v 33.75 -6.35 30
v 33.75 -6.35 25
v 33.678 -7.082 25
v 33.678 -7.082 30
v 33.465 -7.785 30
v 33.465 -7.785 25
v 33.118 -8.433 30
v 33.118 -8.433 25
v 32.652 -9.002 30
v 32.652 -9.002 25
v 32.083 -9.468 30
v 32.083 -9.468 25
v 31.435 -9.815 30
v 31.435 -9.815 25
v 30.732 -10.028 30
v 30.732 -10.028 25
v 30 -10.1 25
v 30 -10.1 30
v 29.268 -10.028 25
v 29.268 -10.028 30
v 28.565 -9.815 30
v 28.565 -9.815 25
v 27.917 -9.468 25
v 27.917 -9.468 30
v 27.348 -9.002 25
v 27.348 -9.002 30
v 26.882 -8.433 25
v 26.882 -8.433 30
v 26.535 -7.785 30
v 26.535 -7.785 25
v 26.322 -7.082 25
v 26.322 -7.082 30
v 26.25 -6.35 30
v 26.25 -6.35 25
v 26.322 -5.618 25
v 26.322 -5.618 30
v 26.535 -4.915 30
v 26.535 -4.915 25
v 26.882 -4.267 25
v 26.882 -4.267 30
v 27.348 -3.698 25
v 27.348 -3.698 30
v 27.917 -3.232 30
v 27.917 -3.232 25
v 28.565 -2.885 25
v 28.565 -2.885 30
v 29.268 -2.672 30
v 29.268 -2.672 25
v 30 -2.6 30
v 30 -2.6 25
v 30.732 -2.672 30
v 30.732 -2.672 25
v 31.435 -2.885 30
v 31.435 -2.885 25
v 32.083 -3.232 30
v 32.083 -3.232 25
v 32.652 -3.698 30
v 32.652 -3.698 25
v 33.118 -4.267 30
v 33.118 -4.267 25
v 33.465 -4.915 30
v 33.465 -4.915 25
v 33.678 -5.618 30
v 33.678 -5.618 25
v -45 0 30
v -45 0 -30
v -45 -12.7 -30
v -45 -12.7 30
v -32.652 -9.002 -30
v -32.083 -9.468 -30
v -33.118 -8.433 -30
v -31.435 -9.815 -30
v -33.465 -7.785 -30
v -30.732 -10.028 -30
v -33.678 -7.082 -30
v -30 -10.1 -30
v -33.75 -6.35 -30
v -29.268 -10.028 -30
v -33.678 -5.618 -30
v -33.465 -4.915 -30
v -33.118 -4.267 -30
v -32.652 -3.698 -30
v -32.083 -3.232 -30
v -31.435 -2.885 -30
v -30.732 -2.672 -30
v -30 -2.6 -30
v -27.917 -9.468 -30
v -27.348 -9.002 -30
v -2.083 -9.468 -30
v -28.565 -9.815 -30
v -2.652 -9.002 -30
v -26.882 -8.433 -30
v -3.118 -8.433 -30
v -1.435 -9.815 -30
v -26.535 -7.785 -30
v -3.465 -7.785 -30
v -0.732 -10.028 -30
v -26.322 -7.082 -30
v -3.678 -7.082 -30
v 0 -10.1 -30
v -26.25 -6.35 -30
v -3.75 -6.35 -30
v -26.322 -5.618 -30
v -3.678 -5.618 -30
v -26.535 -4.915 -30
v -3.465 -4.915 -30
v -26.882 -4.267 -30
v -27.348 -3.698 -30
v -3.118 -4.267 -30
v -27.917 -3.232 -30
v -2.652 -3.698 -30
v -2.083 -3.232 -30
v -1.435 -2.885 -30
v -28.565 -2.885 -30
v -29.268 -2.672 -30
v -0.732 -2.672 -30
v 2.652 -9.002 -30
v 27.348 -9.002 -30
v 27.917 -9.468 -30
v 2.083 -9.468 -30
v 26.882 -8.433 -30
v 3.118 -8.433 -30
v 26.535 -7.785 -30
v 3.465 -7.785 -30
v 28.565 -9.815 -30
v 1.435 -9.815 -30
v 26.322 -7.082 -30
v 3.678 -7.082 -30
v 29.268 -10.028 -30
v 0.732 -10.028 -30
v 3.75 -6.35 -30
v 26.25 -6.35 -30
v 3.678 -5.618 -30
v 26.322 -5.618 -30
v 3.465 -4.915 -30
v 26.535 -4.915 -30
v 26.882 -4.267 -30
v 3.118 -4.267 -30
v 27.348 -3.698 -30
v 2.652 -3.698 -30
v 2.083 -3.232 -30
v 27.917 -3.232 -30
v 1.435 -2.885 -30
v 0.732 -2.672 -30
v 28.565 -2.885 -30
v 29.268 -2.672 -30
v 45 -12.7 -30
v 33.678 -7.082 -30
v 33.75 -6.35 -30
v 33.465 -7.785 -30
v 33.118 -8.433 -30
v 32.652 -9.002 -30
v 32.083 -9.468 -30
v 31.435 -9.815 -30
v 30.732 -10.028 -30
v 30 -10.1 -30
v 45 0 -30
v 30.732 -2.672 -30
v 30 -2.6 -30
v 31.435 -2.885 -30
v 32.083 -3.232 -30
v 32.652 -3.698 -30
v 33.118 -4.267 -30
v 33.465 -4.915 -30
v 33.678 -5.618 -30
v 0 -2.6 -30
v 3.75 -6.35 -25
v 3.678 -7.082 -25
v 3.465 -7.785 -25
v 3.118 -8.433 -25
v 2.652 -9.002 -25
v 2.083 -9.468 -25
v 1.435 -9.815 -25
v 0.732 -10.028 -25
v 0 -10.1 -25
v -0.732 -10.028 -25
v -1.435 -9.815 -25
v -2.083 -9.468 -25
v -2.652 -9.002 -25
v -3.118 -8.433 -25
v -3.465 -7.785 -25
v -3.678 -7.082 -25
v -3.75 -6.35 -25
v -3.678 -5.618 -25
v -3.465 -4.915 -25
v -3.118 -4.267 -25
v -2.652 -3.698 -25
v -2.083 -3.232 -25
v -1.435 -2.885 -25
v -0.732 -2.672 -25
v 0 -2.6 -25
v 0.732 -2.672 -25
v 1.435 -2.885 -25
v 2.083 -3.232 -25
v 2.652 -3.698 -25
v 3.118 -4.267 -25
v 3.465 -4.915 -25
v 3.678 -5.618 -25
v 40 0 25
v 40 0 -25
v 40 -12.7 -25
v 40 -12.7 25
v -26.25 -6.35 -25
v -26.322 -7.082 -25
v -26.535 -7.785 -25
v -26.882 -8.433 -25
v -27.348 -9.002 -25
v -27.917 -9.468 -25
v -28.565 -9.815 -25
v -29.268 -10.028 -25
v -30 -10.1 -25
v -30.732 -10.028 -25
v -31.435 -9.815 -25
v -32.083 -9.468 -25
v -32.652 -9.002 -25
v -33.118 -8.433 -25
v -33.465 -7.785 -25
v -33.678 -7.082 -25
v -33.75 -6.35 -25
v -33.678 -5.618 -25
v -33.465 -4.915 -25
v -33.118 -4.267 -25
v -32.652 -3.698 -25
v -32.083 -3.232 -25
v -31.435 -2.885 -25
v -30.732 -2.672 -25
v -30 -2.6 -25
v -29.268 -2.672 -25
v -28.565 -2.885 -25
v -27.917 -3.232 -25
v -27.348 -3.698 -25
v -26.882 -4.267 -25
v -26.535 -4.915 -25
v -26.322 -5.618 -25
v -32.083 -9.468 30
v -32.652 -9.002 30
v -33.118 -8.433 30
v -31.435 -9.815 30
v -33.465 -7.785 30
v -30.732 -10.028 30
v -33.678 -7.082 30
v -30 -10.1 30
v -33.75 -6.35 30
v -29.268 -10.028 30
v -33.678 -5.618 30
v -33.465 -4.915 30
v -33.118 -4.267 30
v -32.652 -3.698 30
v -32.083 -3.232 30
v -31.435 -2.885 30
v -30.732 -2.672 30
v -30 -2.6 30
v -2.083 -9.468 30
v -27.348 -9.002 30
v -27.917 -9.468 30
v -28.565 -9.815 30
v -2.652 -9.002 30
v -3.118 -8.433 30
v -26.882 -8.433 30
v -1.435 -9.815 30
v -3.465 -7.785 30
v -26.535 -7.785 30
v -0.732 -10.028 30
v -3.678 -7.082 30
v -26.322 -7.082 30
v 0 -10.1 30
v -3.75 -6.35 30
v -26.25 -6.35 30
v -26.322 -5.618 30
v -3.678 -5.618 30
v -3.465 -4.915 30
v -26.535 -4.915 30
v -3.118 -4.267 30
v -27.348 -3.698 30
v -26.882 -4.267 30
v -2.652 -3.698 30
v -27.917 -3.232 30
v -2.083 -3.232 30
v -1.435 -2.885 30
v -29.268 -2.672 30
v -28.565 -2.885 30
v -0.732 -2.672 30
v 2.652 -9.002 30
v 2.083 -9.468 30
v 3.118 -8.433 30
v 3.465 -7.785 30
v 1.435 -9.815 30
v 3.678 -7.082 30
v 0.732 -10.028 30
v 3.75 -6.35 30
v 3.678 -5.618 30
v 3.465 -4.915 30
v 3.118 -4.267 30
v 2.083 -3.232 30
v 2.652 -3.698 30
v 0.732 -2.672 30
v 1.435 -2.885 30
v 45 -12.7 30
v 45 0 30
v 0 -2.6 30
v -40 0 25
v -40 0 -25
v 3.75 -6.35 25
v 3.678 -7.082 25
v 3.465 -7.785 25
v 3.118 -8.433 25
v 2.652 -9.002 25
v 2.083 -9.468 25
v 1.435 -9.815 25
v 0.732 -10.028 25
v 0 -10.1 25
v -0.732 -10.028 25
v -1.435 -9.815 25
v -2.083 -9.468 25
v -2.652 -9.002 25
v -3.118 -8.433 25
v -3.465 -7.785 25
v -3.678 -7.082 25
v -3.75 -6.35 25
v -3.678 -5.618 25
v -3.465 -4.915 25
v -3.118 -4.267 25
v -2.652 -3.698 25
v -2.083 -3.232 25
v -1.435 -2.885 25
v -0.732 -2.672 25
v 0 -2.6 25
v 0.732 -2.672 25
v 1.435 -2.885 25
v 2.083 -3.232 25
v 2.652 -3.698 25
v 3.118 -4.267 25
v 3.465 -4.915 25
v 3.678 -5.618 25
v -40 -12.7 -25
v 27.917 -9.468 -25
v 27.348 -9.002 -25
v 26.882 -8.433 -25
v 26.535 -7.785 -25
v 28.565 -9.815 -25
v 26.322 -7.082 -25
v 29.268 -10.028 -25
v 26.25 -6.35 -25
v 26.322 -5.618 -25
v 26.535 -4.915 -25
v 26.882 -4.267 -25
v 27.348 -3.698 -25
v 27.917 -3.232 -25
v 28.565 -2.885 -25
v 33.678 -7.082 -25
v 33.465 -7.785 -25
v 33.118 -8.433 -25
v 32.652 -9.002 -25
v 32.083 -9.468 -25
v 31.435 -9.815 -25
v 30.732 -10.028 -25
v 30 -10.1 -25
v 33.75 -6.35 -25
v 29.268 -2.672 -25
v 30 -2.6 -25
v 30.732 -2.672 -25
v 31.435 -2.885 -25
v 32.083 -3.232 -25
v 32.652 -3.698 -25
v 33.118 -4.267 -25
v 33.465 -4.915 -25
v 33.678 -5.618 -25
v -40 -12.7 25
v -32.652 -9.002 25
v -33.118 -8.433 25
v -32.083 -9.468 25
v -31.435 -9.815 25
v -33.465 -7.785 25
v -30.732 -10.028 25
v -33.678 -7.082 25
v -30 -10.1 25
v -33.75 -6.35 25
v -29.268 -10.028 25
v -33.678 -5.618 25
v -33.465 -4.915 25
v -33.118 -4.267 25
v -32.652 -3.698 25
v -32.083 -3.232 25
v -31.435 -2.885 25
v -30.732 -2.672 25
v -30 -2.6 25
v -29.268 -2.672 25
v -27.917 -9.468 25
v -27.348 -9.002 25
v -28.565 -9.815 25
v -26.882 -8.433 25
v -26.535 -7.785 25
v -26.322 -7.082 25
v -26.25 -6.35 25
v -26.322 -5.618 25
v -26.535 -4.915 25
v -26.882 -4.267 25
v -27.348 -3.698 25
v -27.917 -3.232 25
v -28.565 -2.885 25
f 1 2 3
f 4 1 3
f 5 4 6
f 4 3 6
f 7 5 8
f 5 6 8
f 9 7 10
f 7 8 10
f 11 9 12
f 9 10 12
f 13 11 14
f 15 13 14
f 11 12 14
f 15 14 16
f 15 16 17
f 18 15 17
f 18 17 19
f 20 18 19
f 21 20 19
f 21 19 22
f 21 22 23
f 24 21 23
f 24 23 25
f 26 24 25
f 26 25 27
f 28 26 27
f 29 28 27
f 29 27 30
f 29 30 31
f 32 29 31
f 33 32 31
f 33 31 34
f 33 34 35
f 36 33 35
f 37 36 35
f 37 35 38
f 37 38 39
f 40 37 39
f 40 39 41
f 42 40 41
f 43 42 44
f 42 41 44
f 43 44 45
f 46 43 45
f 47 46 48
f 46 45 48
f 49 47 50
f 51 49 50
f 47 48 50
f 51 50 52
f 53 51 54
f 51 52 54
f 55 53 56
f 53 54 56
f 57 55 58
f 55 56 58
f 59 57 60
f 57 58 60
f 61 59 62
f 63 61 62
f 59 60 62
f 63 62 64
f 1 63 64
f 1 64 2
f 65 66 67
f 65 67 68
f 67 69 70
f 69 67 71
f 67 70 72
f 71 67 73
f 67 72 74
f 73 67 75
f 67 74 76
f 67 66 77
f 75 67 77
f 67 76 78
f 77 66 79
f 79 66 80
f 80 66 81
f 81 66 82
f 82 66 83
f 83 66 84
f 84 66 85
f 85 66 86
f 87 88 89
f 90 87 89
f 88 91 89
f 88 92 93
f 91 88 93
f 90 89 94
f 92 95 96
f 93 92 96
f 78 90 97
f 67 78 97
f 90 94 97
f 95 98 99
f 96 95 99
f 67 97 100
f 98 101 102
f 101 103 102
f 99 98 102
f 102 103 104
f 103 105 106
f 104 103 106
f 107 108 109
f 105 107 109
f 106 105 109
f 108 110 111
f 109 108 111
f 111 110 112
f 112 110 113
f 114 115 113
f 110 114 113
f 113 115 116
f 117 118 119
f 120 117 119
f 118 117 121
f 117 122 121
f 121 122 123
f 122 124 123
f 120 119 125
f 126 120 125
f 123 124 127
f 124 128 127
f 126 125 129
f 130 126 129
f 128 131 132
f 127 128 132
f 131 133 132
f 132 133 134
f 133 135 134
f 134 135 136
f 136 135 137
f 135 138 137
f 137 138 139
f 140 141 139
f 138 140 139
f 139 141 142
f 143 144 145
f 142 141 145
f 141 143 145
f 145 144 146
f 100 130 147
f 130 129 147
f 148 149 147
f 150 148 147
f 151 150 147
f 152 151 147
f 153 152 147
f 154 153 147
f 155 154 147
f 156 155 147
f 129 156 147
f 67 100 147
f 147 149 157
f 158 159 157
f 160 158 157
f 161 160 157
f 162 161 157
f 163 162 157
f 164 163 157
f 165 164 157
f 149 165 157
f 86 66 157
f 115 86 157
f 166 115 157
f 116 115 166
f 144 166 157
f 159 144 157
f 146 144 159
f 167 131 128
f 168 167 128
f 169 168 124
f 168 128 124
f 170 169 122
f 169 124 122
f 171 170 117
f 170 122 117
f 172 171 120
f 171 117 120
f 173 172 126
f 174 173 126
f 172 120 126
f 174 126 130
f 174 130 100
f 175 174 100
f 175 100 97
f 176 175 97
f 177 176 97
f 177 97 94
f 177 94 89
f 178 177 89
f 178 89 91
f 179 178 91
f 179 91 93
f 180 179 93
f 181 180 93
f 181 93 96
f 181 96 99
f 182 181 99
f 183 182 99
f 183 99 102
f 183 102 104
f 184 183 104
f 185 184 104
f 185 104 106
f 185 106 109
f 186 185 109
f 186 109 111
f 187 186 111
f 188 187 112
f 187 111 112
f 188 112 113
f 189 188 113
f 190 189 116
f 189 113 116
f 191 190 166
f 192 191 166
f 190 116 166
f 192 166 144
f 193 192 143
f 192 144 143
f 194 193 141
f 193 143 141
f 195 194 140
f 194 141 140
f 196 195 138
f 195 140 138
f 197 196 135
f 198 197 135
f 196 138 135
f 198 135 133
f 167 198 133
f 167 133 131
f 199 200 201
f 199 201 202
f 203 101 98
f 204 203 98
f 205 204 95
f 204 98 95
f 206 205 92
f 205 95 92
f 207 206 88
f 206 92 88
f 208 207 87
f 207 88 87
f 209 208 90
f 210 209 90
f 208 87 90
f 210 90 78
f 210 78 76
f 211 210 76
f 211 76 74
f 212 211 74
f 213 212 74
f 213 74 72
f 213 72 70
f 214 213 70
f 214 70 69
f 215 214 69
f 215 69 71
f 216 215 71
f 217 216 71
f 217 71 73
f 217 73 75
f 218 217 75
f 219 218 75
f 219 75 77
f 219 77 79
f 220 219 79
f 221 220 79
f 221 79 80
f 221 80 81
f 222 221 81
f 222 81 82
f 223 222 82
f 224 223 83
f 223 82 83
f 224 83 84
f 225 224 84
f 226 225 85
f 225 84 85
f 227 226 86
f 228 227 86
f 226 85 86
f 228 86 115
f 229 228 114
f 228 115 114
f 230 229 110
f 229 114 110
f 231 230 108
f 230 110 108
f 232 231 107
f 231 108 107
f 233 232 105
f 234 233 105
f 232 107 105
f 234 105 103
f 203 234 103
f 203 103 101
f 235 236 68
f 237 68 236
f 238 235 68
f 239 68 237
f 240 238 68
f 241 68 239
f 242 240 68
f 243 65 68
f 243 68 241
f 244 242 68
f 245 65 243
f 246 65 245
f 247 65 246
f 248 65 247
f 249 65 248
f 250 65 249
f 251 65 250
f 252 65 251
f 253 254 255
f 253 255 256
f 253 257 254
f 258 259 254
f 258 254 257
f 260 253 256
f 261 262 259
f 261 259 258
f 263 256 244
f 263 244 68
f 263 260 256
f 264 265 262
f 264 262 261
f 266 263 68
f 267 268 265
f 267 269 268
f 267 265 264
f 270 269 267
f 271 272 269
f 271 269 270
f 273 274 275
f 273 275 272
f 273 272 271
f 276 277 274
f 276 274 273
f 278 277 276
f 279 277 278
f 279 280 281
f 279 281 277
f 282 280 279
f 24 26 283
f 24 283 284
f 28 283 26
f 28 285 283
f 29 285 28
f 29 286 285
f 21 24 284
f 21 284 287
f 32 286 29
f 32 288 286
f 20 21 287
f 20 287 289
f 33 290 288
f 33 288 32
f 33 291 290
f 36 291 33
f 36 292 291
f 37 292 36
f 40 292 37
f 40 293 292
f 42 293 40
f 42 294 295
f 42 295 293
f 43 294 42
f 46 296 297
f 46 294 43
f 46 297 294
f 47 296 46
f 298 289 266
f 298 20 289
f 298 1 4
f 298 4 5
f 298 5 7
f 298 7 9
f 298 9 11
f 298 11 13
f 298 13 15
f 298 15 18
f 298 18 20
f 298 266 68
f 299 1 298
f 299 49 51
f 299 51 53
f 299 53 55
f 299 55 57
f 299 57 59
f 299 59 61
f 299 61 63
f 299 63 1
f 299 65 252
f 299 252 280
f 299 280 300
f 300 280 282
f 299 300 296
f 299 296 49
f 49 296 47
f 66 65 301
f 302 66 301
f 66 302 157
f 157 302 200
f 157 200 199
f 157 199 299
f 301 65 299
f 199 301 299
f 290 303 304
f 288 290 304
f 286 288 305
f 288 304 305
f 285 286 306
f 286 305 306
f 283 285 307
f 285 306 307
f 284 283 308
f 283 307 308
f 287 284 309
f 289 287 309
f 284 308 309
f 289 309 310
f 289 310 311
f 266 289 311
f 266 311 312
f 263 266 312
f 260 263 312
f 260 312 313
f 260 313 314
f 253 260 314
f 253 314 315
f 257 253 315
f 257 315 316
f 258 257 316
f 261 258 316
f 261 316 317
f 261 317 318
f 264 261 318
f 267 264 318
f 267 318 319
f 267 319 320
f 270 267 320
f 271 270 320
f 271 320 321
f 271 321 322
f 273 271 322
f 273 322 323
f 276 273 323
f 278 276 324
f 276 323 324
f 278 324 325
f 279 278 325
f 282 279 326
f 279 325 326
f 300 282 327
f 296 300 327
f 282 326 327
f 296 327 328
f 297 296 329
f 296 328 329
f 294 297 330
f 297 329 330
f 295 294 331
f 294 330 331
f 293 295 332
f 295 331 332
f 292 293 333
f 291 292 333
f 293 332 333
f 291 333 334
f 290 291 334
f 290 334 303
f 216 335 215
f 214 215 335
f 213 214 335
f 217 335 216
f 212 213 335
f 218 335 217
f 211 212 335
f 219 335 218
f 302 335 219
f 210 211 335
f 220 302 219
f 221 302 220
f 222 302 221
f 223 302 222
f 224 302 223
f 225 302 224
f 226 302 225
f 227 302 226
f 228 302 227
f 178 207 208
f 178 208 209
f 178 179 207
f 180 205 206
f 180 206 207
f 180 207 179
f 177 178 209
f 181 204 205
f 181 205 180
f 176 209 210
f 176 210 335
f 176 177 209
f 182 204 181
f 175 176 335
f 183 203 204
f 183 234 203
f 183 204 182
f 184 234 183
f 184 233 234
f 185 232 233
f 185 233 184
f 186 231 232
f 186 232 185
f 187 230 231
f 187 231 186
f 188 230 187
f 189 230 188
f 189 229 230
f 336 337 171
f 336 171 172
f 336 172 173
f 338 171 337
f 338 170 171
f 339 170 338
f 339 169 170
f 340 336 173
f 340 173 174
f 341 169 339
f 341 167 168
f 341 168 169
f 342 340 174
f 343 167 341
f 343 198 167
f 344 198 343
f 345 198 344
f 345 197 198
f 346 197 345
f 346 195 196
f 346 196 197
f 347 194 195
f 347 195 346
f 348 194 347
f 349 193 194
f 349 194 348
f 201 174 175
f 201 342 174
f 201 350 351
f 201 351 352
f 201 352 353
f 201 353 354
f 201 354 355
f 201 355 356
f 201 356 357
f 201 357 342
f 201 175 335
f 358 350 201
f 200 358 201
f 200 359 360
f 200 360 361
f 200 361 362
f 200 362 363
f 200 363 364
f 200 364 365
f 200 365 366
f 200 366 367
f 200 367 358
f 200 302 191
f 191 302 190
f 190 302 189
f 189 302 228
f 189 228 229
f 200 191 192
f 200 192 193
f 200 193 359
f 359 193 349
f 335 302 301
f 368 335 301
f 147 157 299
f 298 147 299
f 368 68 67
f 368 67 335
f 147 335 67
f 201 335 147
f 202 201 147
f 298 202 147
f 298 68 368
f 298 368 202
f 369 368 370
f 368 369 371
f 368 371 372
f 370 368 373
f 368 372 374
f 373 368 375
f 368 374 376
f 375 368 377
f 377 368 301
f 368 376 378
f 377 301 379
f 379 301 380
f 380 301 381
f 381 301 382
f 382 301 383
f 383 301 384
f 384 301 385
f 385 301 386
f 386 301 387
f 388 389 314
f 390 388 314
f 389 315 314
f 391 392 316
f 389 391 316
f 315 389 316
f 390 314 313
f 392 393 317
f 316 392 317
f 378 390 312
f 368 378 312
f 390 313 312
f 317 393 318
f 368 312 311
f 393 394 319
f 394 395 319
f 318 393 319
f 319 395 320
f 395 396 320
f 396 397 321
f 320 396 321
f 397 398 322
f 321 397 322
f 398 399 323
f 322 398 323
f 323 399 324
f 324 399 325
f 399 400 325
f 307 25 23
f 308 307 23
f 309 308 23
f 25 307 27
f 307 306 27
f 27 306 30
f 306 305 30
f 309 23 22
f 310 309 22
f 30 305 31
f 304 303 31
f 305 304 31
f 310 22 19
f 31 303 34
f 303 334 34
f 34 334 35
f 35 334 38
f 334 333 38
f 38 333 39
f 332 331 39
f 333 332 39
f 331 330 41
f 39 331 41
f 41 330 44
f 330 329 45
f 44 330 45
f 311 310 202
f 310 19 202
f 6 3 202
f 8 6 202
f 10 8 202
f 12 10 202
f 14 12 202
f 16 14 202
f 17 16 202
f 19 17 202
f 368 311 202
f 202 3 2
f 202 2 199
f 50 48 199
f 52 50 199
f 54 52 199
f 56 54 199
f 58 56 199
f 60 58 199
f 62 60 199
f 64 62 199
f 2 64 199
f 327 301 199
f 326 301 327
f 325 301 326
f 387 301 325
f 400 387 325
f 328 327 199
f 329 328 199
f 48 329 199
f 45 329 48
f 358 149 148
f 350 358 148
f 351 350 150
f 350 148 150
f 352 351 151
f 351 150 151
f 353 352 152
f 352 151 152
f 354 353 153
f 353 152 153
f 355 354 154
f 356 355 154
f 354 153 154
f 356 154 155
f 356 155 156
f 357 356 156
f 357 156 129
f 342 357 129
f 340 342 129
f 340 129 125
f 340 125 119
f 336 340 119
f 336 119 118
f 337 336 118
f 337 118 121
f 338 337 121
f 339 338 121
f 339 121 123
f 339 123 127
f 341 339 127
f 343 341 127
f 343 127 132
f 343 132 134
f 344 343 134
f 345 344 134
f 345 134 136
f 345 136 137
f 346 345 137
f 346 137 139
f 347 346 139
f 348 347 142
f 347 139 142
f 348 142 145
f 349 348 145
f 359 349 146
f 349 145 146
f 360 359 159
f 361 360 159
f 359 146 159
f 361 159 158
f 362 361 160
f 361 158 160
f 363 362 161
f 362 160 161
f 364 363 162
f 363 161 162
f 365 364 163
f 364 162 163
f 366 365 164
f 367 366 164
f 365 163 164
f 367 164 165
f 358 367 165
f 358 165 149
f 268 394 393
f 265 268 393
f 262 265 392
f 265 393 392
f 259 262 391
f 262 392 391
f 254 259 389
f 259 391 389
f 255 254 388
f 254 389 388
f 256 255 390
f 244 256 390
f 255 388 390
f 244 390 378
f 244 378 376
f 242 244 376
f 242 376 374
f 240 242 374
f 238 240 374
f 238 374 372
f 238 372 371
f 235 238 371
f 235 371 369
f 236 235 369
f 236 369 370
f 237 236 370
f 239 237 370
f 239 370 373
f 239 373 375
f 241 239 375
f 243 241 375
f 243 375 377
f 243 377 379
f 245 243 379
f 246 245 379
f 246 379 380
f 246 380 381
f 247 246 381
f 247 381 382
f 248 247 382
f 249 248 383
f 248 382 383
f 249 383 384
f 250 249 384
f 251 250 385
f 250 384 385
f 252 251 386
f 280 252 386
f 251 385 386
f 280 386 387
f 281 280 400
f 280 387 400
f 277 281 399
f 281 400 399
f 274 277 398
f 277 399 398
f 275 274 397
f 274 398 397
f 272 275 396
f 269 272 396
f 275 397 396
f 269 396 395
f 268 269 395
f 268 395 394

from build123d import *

# Parameters (mm, degrees)
F0_W     = 90
F0_H     = 60
F0_W_2   = 80
F0_H_2   = 50
F1_DEPTH = 12.7
F2_R     = 3.75
F3_DEPTH = 76.2


# Not quite as in the source:
# - a feature names something its author has since deleted; it is built from what else it names


with BuildPart() as f1:
    # F0 (on Front) → F1 (new body)
    with BuildSketch(Plane.XZ):
        Rectangle(F0_W, F0_H)
        Rectangle(F0_W_2, F0_H_2, mode=Mode.SUBTRACT)
    extrude(amount=F1_DEPTH)

    # F2 (on face) → F3 (cut)
    with BuildSketch(Plane(origin=(0, 0, -30), x_dir=(1, 0, 0), z_dir=(0, 0, -1))):
        with Locations((-30, 6.35)):
            Circle(F2_R)
        with Locations((0, 6.35)):
            Circle(F2_R)
        with Locations((30, 6.35)):
            Circle(F2_R)
    extrude(amount=-F3_DEPTH, mode=Mode.SUBTRACT)


solid = f1.part
